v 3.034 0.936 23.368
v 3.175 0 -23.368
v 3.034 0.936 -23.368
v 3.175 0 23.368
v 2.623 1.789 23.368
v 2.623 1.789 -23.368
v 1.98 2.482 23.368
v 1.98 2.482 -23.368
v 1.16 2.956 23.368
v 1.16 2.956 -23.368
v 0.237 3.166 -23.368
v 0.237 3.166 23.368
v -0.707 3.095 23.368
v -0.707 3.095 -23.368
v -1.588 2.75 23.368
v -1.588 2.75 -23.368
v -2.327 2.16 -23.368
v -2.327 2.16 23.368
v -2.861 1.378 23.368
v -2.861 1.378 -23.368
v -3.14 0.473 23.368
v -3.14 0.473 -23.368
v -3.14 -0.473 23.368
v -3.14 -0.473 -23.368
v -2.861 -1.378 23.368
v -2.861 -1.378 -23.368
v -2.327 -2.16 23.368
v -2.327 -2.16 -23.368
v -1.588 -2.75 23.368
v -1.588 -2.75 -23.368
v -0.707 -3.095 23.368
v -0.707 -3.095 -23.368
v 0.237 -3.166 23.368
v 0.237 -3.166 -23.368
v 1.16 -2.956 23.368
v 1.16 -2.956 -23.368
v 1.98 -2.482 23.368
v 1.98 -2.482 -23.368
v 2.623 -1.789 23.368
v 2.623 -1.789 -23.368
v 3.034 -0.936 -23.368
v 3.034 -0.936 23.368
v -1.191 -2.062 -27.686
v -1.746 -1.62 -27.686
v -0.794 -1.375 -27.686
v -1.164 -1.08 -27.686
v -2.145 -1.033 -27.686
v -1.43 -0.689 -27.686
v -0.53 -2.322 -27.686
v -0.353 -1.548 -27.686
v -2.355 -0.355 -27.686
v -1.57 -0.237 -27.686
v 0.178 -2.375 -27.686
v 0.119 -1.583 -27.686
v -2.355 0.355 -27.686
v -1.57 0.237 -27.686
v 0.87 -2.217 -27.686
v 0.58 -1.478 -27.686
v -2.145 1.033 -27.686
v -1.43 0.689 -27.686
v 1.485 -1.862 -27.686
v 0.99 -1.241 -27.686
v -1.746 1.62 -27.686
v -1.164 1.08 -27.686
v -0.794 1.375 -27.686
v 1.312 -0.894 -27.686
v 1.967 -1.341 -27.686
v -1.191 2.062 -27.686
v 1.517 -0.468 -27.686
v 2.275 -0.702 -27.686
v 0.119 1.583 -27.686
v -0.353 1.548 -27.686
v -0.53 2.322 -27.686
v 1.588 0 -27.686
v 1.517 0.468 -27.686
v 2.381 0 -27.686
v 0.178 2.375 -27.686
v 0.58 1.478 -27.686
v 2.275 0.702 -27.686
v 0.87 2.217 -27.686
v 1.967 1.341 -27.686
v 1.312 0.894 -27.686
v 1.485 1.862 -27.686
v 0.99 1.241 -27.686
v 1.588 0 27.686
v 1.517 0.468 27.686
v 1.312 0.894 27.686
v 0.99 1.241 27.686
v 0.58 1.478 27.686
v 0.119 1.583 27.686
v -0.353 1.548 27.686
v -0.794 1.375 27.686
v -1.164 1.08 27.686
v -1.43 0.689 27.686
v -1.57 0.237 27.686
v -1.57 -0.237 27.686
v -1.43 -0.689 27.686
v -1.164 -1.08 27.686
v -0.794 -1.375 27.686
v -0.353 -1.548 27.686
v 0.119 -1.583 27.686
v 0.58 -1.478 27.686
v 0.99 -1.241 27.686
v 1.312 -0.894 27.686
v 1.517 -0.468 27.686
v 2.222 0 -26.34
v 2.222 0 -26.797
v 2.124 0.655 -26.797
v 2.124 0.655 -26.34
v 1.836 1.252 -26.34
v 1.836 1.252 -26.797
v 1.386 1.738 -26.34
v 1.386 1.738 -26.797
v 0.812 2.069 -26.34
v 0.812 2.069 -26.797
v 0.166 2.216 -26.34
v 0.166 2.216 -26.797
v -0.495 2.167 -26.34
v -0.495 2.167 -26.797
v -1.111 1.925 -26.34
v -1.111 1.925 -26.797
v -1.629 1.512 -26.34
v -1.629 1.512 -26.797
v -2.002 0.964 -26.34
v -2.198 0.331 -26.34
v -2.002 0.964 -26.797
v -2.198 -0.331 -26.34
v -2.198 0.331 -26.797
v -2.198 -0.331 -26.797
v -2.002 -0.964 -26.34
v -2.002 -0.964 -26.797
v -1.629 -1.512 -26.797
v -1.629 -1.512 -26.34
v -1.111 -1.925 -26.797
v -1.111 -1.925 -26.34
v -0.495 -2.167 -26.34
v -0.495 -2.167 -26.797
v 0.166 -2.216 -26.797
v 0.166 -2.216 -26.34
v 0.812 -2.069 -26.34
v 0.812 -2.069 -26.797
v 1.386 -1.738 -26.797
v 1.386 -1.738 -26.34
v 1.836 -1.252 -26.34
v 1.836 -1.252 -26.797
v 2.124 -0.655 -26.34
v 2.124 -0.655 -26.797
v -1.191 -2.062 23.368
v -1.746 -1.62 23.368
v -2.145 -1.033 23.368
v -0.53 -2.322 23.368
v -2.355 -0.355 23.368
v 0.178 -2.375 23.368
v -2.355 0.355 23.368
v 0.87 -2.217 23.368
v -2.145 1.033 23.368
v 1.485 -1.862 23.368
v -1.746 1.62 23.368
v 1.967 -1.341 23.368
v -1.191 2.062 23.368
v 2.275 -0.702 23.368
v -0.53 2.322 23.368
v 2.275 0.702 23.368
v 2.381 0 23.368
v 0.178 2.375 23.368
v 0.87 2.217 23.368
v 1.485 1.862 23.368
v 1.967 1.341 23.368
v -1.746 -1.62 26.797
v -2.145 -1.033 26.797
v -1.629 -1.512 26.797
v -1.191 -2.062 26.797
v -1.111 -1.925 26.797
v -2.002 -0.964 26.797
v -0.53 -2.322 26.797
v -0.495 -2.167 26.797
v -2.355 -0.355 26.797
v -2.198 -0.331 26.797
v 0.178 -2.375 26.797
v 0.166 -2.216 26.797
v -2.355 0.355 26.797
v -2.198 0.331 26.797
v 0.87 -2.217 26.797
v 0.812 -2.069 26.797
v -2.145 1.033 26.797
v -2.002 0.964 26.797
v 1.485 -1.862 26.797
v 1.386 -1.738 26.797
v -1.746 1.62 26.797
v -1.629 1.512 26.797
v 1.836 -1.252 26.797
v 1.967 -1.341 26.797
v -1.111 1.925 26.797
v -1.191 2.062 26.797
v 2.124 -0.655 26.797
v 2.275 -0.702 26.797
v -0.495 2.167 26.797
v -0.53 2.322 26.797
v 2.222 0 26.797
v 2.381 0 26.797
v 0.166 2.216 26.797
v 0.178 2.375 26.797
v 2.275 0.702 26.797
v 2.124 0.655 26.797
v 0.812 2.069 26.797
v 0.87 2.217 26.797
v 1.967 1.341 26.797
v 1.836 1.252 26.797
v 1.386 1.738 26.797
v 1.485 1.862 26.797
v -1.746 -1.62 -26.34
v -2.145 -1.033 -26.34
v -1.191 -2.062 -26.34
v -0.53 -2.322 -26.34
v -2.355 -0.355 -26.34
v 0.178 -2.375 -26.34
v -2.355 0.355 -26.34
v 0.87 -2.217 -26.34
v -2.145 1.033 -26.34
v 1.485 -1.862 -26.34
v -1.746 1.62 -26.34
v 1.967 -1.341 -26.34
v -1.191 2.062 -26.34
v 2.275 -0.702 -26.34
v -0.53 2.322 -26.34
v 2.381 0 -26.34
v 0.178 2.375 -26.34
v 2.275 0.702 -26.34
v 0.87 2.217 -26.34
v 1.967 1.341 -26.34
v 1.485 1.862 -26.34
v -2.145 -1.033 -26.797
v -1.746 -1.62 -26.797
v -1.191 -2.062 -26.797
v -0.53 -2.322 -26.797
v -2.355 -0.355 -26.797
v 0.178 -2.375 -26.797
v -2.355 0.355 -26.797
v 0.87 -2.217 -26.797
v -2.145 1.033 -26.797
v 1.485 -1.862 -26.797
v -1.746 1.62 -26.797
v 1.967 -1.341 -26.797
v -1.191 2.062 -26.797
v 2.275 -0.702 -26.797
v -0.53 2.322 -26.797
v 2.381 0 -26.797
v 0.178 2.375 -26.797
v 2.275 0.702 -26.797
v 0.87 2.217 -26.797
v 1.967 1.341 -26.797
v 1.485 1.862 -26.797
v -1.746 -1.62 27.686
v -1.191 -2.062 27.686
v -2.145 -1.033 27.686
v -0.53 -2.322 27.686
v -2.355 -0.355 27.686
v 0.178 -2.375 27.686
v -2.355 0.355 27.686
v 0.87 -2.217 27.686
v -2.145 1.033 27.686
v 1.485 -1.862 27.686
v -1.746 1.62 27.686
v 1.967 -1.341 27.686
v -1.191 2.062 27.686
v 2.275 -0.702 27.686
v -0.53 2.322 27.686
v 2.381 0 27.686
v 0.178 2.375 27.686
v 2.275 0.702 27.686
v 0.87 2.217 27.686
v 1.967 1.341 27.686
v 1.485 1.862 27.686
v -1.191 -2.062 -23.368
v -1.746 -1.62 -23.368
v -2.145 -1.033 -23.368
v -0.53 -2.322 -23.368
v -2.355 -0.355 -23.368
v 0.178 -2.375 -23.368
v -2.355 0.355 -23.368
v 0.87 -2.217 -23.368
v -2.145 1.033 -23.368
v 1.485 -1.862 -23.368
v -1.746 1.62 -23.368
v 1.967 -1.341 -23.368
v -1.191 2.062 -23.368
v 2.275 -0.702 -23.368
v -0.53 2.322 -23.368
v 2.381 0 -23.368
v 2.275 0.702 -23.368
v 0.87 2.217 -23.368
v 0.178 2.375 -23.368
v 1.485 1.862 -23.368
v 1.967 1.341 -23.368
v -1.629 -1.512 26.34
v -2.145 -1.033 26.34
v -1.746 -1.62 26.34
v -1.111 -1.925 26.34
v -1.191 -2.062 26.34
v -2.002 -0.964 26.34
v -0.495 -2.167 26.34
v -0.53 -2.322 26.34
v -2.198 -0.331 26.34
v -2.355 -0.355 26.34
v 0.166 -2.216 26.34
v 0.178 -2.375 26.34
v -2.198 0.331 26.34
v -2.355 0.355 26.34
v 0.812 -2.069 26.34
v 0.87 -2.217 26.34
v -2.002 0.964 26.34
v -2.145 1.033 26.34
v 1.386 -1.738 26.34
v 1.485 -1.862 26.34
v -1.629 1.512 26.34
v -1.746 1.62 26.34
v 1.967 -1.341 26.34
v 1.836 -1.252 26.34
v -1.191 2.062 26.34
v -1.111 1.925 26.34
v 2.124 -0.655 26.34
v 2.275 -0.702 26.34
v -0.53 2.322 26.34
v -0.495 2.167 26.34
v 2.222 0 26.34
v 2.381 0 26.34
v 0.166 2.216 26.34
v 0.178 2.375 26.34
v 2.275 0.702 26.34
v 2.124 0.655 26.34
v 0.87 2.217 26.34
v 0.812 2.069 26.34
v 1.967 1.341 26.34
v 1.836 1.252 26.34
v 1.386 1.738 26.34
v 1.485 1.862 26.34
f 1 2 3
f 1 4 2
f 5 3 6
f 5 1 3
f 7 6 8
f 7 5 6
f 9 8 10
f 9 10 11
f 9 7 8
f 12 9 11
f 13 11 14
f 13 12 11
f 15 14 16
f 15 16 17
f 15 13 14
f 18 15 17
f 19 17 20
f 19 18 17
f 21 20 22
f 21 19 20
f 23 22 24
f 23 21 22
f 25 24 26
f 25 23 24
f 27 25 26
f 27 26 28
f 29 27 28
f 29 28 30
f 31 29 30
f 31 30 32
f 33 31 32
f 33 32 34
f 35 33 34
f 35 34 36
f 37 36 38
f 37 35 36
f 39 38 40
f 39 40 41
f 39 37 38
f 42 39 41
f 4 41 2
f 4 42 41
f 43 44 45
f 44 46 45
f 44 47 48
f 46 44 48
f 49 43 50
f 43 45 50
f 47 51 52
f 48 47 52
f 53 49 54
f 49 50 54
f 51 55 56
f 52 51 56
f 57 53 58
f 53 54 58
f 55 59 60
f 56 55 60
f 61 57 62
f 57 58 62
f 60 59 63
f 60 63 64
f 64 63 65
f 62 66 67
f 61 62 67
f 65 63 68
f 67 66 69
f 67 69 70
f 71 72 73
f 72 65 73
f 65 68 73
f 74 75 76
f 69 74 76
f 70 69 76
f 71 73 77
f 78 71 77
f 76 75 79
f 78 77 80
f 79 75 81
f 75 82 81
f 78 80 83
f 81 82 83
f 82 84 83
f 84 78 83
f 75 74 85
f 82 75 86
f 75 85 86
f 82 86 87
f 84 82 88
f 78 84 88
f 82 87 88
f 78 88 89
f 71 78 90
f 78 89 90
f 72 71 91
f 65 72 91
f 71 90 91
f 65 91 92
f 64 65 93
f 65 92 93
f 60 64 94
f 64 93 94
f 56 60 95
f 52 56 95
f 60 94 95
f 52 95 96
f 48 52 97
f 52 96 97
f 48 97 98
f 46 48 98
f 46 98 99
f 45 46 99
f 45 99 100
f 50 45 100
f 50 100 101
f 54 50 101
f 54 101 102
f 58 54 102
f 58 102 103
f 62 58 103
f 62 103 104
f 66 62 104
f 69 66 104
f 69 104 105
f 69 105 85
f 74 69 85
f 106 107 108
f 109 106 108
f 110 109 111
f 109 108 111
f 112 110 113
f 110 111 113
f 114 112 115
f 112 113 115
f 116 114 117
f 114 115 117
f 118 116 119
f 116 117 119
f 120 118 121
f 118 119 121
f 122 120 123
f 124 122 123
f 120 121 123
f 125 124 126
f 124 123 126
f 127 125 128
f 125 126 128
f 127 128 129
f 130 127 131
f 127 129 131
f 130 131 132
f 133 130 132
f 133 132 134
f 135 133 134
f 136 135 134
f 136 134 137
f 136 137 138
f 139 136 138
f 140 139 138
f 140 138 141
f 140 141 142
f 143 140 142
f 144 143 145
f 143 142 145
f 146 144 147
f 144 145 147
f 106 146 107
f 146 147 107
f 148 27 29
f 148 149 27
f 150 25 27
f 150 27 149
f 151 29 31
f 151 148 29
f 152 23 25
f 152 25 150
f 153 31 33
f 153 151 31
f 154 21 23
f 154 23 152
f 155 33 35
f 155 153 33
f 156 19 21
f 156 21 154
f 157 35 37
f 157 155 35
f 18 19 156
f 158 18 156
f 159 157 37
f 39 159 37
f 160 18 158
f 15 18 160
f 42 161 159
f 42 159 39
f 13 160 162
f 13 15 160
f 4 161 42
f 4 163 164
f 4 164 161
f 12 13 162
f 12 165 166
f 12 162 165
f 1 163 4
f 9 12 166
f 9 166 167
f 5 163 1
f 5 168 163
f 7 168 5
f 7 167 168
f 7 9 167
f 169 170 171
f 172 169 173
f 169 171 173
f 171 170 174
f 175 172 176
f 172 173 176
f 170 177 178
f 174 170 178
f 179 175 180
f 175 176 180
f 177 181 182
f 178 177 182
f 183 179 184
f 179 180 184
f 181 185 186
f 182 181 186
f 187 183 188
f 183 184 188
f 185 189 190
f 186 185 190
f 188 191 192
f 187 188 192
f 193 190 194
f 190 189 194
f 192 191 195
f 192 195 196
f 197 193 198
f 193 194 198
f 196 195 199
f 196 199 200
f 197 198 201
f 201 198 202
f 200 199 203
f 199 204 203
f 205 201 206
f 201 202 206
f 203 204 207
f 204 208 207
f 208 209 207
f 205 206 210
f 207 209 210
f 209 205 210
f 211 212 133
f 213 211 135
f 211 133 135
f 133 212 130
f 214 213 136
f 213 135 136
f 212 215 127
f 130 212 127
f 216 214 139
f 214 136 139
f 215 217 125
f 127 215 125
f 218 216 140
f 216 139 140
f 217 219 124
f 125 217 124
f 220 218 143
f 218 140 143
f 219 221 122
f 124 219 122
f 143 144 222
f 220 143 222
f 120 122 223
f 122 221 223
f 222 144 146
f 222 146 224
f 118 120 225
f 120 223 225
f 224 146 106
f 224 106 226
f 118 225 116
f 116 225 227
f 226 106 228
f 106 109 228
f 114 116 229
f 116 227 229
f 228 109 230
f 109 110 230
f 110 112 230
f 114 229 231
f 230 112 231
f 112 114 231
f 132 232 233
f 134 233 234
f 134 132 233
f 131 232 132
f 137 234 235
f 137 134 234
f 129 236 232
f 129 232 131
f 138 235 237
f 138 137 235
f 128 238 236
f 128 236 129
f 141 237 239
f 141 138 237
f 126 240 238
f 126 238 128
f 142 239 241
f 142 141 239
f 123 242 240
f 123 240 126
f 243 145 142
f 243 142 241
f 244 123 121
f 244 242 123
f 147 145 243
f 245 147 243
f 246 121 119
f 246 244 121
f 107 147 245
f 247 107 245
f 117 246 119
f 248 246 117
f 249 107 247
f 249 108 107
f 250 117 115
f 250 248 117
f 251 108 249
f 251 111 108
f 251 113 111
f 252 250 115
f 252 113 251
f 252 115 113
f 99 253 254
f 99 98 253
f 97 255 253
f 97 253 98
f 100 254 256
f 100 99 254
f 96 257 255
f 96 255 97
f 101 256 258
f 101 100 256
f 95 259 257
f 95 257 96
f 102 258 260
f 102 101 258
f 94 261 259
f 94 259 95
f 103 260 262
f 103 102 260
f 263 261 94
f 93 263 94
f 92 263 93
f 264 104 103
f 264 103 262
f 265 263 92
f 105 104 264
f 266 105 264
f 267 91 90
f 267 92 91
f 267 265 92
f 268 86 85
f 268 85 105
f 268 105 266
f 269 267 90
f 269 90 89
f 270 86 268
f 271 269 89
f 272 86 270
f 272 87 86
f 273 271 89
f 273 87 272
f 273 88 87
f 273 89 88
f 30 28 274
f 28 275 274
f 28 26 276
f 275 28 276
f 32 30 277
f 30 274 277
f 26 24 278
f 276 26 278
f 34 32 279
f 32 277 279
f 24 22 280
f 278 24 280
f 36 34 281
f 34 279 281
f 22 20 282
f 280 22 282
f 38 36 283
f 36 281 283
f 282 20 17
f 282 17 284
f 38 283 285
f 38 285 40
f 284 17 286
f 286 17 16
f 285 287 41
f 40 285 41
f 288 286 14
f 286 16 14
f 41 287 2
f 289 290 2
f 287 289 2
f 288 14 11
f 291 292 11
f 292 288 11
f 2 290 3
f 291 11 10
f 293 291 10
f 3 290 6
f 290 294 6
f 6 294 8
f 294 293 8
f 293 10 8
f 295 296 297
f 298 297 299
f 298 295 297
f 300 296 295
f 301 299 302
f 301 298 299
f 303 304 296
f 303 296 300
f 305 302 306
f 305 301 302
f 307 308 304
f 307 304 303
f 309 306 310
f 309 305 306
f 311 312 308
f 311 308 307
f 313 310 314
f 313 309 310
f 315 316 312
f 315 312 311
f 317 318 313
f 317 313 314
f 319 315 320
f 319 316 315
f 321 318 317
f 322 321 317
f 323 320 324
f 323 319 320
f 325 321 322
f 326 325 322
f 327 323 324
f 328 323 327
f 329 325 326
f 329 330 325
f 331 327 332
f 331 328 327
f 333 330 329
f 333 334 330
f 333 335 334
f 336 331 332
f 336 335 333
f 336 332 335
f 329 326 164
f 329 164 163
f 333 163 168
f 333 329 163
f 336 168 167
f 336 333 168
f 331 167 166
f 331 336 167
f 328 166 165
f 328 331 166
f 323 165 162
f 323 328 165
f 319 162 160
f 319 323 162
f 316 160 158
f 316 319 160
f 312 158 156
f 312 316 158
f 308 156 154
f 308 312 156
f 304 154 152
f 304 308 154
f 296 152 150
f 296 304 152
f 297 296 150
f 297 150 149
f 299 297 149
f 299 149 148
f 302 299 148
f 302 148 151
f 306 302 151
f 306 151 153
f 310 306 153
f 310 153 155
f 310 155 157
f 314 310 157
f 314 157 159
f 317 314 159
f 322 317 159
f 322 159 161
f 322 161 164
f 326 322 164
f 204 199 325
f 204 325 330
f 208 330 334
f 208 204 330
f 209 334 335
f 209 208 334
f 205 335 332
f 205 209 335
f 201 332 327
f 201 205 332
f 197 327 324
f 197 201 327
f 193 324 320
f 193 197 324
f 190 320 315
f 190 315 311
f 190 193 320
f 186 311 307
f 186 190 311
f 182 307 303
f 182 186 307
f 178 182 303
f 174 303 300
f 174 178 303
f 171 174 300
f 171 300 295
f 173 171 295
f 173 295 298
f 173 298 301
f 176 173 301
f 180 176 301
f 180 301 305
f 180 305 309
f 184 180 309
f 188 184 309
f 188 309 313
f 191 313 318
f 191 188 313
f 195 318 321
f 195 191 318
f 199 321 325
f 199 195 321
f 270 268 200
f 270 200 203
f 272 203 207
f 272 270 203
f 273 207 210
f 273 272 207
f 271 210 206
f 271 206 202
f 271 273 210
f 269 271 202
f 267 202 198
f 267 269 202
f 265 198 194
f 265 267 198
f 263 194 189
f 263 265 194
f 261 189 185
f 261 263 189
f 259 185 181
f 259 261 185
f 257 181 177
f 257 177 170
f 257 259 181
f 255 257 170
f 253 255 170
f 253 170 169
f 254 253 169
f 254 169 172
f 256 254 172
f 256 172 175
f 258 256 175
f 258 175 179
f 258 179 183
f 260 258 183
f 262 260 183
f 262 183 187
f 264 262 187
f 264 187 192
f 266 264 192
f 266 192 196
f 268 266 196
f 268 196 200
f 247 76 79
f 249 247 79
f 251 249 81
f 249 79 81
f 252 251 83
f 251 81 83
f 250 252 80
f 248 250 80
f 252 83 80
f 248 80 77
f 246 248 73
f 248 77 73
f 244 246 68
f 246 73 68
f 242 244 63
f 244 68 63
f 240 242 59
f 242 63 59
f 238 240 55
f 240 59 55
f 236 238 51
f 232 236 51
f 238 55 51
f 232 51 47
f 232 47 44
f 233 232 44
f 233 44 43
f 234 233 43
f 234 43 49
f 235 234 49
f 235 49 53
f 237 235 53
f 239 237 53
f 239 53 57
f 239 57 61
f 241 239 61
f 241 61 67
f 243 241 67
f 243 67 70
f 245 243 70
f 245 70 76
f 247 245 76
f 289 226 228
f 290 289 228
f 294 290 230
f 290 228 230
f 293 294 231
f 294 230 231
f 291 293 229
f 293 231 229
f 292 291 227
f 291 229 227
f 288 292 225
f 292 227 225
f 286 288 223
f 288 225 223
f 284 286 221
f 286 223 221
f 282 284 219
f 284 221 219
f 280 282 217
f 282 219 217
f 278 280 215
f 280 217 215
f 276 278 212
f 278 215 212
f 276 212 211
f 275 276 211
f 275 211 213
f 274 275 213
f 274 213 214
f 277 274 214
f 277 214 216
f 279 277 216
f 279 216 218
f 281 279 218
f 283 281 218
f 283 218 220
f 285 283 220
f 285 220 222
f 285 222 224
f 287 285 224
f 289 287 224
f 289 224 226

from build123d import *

# Parameters (mm, degrees)
SKETCH1_R           = 3.175
BOSS_EXTRUDE1_DEPTH = 27.686
SKETCH2_R           = 3.175
SKETCH2_R_2         = 2.38125
CUT_EXTRUDE1_DEPTH  = 4.318
SKETCH3_R           = 2.38125
SKETCH3_R_2         = 2.2225
CUT_EXTRUDE2_DEPTH  = 0.4572
SKETCH4_R           = 1.5875
CUT_EXTRUDE3_DEPTH  = 56.553754455


with BuildPart() as part:
    # Sketch1 → Boss-Extrude1 (new, symmetric)
    with BuildSketch(Plane.XY):
        Circle(SKETCH1_R)
    extrude(amount=BOSS_EXTRUDE1_DEPTH, both=True)

    # Sketch2 → Cut-Extrude1 (cut)
    with BuildSketch(Plane.XY.offset(27.686)):
        Circle(SKETCH2_R)
        Circle(SKETCH2_R_2, mode=Mode.SUBTRACT)
    cut_extrude1 = extrude(amount=-CUT_EXTRUDE1_DEPTH, mode=Mode.SUBTRACT)

    # Sketch3 → Cut-Extrude2 (cut)
    with BuildSketch(Plane.XY.offset(26.797)):
        Circle(SKETCH3_R)
        Circle(SKETCH3_R_2, mode=Mode.SUBTRACT)
    cut_extrude2 = extrude(amount=-CUT_EXTRUDE2_DEPTH, mode=Mode.SUBTRACT)

    # Sketch4 → Cut-Extrude3 (cut, through all)
    with BuildSketch(Plane.XY.offset(27.686)):
        Circle(SKETCH4_R)
    extrude(amount=-CUT_EXTRUDE3_DEPTH, mode=Mode.SUBTRACT)

    # Mirror1: Cut-Extrude1, Cut-Extrude2 across plane
    add(cut_extrude1.mirror(Plane.XY), mode=Mode.SUBTRACT)
    add(cut_extrude2.mirror(Plane.XY), mode=Mode.SUBTRACT)


solid = part.part
